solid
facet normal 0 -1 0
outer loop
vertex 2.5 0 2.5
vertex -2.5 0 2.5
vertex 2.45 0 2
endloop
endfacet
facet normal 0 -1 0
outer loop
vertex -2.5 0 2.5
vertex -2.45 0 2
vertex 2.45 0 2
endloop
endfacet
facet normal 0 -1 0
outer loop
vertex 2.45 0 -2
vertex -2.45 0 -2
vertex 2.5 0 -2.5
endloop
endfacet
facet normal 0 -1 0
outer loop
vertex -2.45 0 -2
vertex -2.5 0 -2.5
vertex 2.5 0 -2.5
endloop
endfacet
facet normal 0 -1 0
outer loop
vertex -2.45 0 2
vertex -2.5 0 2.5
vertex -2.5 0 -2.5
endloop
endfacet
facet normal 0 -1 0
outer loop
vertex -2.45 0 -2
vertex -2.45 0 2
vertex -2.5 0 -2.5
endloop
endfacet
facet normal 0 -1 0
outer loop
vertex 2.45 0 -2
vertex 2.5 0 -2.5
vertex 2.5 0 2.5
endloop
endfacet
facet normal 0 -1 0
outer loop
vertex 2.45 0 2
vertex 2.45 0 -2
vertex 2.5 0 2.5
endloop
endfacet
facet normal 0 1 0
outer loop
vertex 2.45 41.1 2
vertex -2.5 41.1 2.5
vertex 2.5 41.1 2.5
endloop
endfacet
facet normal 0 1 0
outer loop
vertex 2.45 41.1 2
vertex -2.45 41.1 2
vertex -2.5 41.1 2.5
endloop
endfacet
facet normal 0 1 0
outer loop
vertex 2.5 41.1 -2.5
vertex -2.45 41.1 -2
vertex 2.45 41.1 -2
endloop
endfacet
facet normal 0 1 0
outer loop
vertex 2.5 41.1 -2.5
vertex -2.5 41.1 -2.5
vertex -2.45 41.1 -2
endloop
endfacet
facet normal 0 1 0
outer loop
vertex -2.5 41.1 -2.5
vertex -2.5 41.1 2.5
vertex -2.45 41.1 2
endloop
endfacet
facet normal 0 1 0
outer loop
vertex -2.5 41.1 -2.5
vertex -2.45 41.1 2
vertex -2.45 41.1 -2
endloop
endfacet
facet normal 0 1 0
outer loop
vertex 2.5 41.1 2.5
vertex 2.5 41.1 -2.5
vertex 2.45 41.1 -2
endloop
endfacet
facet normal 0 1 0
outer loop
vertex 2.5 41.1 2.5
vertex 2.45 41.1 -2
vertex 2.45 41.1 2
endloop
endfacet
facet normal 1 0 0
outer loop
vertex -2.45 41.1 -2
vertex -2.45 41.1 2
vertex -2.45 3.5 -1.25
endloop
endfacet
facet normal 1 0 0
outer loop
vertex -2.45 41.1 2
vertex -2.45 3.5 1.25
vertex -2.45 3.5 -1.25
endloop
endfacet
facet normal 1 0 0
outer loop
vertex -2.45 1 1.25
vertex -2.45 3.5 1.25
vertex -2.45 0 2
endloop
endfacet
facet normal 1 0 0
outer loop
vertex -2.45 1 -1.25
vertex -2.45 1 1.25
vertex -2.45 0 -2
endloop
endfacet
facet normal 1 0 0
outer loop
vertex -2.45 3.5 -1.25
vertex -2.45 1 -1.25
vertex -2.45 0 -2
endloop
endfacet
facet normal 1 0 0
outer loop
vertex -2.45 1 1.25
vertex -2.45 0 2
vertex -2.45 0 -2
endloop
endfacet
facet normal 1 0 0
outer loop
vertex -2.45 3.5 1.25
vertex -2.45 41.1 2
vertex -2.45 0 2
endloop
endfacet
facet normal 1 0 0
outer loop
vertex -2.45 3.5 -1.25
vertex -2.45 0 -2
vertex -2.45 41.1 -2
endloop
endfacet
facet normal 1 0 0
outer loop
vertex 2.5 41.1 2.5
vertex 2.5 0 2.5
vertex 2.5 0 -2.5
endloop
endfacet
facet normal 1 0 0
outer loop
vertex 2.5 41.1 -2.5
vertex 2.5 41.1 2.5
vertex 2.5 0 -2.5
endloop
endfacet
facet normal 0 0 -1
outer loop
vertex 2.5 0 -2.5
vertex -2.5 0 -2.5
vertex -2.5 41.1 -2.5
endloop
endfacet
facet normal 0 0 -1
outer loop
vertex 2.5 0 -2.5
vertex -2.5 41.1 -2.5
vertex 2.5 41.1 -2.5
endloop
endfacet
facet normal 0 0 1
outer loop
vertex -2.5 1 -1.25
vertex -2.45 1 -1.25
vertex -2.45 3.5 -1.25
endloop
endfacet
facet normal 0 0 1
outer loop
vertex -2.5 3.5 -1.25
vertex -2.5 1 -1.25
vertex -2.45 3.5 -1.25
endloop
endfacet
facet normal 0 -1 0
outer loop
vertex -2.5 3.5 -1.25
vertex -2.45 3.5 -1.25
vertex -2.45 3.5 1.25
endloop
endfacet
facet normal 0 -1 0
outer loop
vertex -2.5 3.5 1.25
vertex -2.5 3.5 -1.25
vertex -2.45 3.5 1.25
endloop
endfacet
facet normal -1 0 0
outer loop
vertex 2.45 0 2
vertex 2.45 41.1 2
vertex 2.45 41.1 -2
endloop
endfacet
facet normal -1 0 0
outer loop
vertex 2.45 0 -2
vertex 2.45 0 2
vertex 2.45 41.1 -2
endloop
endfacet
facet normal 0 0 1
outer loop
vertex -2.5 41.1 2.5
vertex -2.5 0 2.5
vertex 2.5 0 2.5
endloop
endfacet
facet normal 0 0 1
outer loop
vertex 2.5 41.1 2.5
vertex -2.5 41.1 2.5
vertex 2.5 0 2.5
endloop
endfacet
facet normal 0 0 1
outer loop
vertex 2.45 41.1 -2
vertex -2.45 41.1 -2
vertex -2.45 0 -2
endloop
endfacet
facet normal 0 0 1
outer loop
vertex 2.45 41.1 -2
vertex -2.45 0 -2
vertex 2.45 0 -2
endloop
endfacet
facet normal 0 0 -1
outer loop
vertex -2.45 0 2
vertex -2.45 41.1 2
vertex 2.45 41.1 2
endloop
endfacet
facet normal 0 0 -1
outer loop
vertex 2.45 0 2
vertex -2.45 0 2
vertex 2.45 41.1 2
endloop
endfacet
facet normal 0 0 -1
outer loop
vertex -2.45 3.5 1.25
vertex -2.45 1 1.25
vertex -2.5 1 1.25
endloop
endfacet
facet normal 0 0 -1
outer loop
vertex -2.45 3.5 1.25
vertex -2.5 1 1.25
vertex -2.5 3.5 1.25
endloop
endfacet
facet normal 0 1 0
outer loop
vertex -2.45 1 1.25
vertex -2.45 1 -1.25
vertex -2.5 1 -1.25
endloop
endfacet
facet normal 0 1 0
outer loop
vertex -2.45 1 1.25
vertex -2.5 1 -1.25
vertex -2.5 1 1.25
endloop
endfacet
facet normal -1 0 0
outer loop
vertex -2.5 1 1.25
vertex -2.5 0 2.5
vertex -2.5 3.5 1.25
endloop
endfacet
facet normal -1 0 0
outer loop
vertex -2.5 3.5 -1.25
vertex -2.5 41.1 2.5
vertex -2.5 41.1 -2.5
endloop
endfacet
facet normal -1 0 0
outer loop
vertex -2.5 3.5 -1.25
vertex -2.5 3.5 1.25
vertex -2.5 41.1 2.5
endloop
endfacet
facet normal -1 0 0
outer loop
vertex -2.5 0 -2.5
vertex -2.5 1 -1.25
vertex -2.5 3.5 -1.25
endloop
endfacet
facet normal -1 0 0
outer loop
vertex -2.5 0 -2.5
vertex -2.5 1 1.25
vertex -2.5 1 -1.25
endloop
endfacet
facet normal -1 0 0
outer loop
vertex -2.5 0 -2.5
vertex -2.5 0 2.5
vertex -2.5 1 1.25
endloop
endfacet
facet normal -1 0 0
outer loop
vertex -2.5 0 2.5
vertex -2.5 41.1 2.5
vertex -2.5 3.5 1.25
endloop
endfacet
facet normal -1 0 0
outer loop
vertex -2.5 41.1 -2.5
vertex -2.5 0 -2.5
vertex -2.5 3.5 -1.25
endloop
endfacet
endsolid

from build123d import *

# Parameters (mm, degrees)
SKETCH1_W               = 5
SKETCH1_H               = 5
SKETCH1_W_2             = 4.9
SKETCH1_H_2             = 4
BOSS_EXTRUDE1_DEPTH     = 41.1
CUT_EXTRUDE1_DEPTH      = 42.478428128
CUT_EXTRUDE1_DEPTH_BACK = 0.05
SKETCH2_W               = 2.5
SKETCH2_H               = 2.5


with BuildPart() as part:
    # Sketch1 → Boss-Extrude1 (new body)
    with BuildSketch(Plane(origin=(0, 0, 0), x_dir=(1, 0, 0), z_dir=(0, 1, 0))):
        Rectangle(SKETCH1_W, SKETCH1_H)
        Rectangle(SKETCH1_W_2, SKETCH1_H_2, mode=Mode.SUBTRACT)
    extrude(amount=BOSS_EXTRUDE1_DEPTH)

    # Sketch2 → Cut-Extrude1 (cut, two sides: drawn at the far end of the back side and taken through both)
    with BuildSketch(Plane.ZY.offset(2.5).offset(-CUT_EXTRUDE1_DEPTH_BACK)):
        with Locations((0, 2.25)):
            Rectangle(SKETCH2_W, SKETCH2_H)
    extrude(amount=CUT_EXTRUDE1_DEPTH + CUT_EXTRUDE1_DEPTH_BACK, mode=Mode.SUBTRACT)


solid = part.part
